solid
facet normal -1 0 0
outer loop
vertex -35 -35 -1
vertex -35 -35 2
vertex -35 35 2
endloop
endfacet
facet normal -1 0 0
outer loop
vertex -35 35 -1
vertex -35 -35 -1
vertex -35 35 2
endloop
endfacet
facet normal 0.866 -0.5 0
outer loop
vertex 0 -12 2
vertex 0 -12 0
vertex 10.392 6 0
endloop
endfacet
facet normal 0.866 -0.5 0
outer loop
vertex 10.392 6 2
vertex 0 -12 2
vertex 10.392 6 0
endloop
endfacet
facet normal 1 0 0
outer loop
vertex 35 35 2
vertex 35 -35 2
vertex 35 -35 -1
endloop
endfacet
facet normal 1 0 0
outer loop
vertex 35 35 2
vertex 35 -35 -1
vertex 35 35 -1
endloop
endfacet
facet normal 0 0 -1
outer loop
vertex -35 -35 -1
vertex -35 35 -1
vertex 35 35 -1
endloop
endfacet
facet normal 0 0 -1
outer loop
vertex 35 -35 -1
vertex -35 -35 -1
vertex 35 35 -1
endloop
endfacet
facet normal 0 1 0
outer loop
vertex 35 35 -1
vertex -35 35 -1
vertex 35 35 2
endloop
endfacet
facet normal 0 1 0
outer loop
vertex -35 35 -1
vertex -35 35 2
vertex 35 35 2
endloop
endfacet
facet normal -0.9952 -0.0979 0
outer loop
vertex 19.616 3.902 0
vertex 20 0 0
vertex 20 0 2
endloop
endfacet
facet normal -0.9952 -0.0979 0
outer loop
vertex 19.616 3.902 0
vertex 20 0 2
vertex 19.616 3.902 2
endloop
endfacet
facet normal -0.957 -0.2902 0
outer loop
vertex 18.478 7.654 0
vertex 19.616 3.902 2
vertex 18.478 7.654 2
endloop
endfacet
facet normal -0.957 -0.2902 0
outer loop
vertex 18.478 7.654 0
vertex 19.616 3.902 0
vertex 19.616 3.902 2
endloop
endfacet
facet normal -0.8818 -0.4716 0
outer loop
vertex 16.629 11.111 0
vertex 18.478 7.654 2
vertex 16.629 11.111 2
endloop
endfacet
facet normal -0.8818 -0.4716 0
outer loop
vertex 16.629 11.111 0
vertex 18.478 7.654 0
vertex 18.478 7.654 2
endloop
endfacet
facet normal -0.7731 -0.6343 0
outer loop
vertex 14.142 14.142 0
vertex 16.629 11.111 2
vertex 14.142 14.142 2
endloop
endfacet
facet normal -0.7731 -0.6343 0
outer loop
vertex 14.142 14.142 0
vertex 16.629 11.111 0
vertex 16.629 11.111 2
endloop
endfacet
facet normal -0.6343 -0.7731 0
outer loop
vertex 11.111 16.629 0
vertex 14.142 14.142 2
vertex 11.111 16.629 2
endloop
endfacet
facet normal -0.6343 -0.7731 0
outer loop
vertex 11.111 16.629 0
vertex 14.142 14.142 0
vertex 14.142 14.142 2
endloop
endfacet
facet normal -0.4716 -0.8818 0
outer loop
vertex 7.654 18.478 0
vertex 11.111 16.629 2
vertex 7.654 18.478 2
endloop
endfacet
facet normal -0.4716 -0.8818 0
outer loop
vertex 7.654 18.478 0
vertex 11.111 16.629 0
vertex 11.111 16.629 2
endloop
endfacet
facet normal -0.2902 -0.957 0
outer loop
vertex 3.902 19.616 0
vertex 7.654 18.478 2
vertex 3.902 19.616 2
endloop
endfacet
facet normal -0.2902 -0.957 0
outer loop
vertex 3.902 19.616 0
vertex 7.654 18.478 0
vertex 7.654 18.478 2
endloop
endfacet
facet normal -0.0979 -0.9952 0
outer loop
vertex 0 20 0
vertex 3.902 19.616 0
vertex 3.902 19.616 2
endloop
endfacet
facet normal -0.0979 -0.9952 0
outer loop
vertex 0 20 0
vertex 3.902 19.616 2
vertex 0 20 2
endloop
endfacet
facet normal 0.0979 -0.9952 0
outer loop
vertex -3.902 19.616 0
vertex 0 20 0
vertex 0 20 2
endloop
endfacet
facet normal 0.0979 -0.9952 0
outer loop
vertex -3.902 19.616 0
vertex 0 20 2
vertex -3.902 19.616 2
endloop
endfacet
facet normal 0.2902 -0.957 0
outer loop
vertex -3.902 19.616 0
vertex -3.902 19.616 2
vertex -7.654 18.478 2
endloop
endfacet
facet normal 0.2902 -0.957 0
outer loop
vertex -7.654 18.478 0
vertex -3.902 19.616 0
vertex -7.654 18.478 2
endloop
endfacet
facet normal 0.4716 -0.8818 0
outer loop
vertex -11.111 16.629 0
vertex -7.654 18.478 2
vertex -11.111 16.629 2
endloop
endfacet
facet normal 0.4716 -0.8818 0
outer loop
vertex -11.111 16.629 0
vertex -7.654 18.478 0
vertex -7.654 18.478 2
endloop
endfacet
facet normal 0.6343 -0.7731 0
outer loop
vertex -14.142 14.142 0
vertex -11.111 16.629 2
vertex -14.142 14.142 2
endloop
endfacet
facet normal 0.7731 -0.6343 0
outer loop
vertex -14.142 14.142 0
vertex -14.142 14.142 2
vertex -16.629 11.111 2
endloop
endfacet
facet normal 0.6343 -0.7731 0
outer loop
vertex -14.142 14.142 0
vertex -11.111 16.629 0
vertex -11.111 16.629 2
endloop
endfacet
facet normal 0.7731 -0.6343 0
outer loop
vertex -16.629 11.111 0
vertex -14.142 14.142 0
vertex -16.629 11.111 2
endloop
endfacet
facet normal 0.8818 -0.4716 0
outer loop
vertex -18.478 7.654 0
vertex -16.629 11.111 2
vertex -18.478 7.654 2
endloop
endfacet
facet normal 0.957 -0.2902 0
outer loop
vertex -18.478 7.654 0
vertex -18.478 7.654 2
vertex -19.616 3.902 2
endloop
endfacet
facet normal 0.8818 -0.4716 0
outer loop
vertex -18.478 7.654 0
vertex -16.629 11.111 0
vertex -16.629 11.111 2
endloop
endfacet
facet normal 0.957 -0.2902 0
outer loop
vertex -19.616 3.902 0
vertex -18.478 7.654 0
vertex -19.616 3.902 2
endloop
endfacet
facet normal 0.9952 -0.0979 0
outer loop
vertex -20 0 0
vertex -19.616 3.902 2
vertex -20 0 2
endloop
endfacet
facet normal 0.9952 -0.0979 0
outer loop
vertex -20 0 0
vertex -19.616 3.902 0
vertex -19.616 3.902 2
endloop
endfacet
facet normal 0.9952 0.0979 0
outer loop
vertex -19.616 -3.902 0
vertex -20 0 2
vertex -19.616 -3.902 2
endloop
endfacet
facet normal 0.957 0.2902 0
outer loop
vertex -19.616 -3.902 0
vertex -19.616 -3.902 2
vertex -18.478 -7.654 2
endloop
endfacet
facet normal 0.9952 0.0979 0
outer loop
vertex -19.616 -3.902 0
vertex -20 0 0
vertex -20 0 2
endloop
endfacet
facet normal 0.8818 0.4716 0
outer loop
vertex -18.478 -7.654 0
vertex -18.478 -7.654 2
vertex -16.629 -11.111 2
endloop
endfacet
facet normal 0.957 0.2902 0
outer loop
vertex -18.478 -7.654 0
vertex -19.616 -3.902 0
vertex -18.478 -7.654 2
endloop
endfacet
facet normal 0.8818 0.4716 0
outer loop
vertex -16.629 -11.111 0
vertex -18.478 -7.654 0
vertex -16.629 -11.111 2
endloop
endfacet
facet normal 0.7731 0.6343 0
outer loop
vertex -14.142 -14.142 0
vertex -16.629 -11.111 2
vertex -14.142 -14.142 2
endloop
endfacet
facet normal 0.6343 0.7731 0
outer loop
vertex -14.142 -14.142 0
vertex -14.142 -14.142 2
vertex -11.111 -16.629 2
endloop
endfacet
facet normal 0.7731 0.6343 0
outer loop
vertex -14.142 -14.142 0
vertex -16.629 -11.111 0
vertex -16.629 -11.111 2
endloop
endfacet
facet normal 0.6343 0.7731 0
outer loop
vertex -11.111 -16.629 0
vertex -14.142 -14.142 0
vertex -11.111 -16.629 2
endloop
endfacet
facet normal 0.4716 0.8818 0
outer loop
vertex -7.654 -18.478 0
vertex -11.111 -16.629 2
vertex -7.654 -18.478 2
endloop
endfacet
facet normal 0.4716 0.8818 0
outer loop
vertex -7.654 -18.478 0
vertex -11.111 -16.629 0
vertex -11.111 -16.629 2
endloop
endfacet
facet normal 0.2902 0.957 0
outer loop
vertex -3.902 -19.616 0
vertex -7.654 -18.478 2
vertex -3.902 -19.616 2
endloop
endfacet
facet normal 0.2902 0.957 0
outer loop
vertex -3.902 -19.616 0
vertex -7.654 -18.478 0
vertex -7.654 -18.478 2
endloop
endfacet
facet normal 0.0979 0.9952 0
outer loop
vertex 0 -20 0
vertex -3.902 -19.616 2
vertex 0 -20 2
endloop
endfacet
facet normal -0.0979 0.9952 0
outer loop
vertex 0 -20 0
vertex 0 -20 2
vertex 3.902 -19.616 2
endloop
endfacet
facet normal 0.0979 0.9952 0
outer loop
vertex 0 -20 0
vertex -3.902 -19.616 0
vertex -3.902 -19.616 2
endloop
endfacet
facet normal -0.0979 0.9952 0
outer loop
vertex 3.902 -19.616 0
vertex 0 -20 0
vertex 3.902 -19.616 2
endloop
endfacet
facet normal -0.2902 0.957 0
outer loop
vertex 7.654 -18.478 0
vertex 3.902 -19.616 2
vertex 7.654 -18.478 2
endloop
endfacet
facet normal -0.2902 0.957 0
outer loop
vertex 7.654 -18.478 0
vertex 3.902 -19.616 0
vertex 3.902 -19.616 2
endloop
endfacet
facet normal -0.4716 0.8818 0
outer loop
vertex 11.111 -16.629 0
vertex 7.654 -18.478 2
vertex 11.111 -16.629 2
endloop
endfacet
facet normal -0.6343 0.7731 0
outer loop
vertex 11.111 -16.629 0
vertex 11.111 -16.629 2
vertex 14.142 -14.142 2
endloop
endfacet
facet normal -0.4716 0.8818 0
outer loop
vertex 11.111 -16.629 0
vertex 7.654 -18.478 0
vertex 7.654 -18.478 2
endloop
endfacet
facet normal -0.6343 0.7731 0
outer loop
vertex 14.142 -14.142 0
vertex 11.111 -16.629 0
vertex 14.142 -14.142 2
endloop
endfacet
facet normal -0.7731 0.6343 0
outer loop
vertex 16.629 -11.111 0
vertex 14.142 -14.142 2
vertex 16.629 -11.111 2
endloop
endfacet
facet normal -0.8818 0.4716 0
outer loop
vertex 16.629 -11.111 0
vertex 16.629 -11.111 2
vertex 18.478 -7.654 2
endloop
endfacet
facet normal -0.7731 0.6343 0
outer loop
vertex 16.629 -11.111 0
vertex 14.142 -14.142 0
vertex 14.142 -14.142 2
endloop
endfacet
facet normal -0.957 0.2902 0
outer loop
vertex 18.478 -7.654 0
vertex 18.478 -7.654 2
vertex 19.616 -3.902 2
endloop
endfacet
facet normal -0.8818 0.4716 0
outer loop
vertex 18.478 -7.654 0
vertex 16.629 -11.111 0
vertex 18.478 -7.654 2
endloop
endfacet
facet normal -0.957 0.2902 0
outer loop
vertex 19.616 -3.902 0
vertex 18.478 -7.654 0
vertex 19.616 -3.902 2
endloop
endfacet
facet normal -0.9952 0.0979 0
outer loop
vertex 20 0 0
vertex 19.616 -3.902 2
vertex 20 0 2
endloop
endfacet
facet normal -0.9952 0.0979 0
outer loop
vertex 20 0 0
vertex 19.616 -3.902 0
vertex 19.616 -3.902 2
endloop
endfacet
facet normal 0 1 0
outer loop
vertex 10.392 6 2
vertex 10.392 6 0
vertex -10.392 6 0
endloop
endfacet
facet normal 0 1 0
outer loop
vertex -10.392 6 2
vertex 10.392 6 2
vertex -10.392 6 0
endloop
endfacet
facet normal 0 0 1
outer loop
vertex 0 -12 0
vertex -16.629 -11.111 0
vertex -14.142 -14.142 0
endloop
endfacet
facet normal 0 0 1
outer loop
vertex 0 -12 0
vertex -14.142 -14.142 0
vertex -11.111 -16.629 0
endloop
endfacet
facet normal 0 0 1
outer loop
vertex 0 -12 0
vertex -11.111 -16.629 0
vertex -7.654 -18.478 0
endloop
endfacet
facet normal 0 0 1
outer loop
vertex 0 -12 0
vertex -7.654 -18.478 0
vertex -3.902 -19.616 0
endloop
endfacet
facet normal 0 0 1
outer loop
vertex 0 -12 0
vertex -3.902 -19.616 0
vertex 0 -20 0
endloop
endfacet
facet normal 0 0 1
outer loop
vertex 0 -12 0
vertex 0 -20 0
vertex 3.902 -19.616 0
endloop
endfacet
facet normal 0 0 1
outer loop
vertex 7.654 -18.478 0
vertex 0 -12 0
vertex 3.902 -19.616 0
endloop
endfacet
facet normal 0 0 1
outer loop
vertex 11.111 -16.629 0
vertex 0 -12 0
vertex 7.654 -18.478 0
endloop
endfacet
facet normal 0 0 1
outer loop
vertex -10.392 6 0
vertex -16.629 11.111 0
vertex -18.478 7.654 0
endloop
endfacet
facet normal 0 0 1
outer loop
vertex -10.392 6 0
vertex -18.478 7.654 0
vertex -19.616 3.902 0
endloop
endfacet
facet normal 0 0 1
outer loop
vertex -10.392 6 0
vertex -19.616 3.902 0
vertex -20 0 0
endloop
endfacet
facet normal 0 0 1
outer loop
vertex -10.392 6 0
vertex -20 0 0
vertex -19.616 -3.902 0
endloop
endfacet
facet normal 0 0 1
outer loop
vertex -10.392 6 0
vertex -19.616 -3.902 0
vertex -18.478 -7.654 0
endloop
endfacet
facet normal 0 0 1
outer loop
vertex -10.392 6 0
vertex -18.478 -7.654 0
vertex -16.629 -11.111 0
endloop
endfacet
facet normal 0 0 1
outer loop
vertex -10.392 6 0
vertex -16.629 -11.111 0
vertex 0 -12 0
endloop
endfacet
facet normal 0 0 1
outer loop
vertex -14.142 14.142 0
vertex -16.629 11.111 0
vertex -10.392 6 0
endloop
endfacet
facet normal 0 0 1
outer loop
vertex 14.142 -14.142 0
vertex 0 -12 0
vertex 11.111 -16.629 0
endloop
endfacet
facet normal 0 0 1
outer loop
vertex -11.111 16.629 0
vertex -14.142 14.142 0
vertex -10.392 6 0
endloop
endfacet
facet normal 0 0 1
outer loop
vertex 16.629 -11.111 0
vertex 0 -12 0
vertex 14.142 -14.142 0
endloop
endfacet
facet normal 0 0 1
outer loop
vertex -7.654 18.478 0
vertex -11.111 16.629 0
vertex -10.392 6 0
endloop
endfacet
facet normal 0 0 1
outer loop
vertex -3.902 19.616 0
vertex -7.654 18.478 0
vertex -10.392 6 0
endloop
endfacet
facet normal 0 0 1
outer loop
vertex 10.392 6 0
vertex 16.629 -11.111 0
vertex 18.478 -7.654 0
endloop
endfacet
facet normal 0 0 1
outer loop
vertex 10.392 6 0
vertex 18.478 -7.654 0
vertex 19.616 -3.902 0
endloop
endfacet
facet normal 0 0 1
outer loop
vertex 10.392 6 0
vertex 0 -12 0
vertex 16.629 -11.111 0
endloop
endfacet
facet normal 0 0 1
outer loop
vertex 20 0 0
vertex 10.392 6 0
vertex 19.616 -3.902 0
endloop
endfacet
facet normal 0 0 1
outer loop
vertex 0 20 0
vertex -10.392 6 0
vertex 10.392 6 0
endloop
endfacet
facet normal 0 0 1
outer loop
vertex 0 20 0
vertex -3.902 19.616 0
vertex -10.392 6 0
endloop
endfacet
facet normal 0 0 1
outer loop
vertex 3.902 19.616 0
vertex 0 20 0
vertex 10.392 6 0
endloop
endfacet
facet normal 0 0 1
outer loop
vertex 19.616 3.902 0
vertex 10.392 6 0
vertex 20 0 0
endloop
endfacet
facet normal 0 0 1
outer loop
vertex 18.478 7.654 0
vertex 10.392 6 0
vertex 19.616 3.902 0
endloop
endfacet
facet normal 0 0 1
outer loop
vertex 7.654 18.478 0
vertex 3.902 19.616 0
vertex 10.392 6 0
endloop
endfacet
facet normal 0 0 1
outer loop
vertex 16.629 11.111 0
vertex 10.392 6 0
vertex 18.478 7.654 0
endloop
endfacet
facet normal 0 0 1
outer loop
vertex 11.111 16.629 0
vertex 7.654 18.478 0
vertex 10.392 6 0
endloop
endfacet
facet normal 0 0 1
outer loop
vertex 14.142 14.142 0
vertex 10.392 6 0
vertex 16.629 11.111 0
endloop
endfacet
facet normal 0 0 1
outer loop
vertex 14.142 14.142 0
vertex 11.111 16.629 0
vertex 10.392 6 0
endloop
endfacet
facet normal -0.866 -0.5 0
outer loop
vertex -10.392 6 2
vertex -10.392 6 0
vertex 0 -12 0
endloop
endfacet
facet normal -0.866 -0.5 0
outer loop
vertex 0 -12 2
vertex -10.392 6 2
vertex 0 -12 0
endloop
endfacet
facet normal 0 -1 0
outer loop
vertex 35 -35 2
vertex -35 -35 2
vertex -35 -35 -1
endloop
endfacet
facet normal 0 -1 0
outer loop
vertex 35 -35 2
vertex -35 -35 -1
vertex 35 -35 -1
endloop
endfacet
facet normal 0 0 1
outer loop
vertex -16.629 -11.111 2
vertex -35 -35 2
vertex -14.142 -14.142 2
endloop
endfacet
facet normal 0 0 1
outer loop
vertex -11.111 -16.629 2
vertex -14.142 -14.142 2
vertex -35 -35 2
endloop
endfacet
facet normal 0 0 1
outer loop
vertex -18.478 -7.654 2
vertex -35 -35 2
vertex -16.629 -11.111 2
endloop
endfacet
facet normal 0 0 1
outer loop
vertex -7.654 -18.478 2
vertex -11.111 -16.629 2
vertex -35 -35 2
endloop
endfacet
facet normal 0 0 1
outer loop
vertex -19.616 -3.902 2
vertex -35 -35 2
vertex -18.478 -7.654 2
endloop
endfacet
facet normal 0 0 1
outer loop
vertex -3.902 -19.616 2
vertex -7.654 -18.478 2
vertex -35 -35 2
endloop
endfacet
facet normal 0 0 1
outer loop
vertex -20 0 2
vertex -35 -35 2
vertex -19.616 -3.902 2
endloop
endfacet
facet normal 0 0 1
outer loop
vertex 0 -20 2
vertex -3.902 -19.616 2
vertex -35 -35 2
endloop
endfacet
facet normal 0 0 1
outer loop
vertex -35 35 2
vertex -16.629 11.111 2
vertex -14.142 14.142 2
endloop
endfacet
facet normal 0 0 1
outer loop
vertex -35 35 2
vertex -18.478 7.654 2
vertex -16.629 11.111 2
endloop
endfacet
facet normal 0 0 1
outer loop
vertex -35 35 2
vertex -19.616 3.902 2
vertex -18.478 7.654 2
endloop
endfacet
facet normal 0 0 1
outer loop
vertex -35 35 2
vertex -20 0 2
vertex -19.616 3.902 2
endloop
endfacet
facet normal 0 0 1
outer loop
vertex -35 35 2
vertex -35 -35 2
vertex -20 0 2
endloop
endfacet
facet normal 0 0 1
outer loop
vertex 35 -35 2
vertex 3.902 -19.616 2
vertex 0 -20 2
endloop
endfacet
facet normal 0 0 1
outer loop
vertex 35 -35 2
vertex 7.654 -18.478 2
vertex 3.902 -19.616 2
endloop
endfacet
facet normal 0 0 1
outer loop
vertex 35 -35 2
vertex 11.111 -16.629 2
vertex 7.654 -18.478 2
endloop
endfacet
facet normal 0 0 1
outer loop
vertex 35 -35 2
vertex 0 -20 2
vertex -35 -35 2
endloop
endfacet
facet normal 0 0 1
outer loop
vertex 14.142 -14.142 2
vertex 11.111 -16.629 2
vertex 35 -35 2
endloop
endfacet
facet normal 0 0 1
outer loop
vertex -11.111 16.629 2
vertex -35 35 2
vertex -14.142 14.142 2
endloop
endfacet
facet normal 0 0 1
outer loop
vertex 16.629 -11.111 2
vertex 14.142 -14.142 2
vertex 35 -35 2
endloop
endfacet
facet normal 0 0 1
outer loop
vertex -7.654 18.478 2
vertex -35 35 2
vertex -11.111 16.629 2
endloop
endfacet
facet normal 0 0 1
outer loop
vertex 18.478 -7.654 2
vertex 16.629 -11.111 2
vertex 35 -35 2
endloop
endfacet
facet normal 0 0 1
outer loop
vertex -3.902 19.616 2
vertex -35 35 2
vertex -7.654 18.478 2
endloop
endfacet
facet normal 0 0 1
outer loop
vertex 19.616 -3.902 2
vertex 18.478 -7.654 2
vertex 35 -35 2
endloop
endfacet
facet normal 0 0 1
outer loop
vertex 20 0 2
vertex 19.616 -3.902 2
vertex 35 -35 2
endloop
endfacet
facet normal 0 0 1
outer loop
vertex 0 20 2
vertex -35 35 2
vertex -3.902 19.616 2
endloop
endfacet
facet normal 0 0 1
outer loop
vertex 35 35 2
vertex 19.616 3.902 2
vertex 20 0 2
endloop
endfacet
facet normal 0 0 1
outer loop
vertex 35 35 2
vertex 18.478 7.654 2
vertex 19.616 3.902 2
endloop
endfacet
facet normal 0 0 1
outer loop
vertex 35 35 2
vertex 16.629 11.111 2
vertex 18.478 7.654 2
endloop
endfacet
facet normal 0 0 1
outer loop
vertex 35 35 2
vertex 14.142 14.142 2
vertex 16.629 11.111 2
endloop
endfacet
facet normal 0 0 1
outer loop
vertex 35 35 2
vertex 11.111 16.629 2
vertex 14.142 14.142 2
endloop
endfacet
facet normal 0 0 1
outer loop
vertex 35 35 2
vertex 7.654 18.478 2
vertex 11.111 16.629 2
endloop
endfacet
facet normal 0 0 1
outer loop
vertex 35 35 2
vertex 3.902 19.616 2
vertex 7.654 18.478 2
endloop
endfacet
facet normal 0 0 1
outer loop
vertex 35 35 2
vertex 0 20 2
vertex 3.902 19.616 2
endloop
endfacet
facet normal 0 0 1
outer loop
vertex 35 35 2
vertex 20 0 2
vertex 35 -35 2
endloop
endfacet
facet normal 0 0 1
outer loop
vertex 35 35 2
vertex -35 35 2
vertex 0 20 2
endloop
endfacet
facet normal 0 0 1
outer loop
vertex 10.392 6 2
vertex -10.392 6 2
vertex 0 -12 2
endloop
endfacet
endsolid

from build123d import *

# Parameters (mm, degrees)
F0_W     = 70
F0_H     = 70
F0_R     = 20
F1_DEPTH = 2
F2_DEPTH = 1


# Not quite as in the source:
# - a feature names something its author has since deleted; it is built from what else it names


with BuildPart() as f1:
    # F0 (on Top) → F1 (new body)
    with BuildSketch(Plane.XY):
        Rectangle(F0_W, F0_H)
        Circle(F0_R, mode=Mode.SUBTRACT)
    extrude(amount=F1_DEPTH)



with BuildPart() as f1b:
    # F0 (on Top) → F1, piece 2 (new body)
    with BuildSketch(Plane.XY):
        Polygon((10.3923048454, 6), (-10.3923048454, 6), (0, -12), align=None)
    extrude(amount=F1_DEPTH)


with BuildPart() as f1_1:
    add(f1.part)

    add(f1b.part)  # F2 merges F1b
    # F0 (on Top) → F2 (join)
    with BuildSketch(Plane.XY):
        Rectangle(F0_W, F0_H)
        Circle(F0_R, mode=Mode.SUBTRACT)
        Circle(F0_R)
        Polygon((0, -12), (-10.3923048454, 6), (10.3923048454, 6), align=None, mode=Mode.SUBTRACT)
        Polygon((10.3923048454, 6), (-10.3923048454, 6), (0, -12), align=None)
    extrude(amount=-F2_DEPTH)


solid = f1_1.part
